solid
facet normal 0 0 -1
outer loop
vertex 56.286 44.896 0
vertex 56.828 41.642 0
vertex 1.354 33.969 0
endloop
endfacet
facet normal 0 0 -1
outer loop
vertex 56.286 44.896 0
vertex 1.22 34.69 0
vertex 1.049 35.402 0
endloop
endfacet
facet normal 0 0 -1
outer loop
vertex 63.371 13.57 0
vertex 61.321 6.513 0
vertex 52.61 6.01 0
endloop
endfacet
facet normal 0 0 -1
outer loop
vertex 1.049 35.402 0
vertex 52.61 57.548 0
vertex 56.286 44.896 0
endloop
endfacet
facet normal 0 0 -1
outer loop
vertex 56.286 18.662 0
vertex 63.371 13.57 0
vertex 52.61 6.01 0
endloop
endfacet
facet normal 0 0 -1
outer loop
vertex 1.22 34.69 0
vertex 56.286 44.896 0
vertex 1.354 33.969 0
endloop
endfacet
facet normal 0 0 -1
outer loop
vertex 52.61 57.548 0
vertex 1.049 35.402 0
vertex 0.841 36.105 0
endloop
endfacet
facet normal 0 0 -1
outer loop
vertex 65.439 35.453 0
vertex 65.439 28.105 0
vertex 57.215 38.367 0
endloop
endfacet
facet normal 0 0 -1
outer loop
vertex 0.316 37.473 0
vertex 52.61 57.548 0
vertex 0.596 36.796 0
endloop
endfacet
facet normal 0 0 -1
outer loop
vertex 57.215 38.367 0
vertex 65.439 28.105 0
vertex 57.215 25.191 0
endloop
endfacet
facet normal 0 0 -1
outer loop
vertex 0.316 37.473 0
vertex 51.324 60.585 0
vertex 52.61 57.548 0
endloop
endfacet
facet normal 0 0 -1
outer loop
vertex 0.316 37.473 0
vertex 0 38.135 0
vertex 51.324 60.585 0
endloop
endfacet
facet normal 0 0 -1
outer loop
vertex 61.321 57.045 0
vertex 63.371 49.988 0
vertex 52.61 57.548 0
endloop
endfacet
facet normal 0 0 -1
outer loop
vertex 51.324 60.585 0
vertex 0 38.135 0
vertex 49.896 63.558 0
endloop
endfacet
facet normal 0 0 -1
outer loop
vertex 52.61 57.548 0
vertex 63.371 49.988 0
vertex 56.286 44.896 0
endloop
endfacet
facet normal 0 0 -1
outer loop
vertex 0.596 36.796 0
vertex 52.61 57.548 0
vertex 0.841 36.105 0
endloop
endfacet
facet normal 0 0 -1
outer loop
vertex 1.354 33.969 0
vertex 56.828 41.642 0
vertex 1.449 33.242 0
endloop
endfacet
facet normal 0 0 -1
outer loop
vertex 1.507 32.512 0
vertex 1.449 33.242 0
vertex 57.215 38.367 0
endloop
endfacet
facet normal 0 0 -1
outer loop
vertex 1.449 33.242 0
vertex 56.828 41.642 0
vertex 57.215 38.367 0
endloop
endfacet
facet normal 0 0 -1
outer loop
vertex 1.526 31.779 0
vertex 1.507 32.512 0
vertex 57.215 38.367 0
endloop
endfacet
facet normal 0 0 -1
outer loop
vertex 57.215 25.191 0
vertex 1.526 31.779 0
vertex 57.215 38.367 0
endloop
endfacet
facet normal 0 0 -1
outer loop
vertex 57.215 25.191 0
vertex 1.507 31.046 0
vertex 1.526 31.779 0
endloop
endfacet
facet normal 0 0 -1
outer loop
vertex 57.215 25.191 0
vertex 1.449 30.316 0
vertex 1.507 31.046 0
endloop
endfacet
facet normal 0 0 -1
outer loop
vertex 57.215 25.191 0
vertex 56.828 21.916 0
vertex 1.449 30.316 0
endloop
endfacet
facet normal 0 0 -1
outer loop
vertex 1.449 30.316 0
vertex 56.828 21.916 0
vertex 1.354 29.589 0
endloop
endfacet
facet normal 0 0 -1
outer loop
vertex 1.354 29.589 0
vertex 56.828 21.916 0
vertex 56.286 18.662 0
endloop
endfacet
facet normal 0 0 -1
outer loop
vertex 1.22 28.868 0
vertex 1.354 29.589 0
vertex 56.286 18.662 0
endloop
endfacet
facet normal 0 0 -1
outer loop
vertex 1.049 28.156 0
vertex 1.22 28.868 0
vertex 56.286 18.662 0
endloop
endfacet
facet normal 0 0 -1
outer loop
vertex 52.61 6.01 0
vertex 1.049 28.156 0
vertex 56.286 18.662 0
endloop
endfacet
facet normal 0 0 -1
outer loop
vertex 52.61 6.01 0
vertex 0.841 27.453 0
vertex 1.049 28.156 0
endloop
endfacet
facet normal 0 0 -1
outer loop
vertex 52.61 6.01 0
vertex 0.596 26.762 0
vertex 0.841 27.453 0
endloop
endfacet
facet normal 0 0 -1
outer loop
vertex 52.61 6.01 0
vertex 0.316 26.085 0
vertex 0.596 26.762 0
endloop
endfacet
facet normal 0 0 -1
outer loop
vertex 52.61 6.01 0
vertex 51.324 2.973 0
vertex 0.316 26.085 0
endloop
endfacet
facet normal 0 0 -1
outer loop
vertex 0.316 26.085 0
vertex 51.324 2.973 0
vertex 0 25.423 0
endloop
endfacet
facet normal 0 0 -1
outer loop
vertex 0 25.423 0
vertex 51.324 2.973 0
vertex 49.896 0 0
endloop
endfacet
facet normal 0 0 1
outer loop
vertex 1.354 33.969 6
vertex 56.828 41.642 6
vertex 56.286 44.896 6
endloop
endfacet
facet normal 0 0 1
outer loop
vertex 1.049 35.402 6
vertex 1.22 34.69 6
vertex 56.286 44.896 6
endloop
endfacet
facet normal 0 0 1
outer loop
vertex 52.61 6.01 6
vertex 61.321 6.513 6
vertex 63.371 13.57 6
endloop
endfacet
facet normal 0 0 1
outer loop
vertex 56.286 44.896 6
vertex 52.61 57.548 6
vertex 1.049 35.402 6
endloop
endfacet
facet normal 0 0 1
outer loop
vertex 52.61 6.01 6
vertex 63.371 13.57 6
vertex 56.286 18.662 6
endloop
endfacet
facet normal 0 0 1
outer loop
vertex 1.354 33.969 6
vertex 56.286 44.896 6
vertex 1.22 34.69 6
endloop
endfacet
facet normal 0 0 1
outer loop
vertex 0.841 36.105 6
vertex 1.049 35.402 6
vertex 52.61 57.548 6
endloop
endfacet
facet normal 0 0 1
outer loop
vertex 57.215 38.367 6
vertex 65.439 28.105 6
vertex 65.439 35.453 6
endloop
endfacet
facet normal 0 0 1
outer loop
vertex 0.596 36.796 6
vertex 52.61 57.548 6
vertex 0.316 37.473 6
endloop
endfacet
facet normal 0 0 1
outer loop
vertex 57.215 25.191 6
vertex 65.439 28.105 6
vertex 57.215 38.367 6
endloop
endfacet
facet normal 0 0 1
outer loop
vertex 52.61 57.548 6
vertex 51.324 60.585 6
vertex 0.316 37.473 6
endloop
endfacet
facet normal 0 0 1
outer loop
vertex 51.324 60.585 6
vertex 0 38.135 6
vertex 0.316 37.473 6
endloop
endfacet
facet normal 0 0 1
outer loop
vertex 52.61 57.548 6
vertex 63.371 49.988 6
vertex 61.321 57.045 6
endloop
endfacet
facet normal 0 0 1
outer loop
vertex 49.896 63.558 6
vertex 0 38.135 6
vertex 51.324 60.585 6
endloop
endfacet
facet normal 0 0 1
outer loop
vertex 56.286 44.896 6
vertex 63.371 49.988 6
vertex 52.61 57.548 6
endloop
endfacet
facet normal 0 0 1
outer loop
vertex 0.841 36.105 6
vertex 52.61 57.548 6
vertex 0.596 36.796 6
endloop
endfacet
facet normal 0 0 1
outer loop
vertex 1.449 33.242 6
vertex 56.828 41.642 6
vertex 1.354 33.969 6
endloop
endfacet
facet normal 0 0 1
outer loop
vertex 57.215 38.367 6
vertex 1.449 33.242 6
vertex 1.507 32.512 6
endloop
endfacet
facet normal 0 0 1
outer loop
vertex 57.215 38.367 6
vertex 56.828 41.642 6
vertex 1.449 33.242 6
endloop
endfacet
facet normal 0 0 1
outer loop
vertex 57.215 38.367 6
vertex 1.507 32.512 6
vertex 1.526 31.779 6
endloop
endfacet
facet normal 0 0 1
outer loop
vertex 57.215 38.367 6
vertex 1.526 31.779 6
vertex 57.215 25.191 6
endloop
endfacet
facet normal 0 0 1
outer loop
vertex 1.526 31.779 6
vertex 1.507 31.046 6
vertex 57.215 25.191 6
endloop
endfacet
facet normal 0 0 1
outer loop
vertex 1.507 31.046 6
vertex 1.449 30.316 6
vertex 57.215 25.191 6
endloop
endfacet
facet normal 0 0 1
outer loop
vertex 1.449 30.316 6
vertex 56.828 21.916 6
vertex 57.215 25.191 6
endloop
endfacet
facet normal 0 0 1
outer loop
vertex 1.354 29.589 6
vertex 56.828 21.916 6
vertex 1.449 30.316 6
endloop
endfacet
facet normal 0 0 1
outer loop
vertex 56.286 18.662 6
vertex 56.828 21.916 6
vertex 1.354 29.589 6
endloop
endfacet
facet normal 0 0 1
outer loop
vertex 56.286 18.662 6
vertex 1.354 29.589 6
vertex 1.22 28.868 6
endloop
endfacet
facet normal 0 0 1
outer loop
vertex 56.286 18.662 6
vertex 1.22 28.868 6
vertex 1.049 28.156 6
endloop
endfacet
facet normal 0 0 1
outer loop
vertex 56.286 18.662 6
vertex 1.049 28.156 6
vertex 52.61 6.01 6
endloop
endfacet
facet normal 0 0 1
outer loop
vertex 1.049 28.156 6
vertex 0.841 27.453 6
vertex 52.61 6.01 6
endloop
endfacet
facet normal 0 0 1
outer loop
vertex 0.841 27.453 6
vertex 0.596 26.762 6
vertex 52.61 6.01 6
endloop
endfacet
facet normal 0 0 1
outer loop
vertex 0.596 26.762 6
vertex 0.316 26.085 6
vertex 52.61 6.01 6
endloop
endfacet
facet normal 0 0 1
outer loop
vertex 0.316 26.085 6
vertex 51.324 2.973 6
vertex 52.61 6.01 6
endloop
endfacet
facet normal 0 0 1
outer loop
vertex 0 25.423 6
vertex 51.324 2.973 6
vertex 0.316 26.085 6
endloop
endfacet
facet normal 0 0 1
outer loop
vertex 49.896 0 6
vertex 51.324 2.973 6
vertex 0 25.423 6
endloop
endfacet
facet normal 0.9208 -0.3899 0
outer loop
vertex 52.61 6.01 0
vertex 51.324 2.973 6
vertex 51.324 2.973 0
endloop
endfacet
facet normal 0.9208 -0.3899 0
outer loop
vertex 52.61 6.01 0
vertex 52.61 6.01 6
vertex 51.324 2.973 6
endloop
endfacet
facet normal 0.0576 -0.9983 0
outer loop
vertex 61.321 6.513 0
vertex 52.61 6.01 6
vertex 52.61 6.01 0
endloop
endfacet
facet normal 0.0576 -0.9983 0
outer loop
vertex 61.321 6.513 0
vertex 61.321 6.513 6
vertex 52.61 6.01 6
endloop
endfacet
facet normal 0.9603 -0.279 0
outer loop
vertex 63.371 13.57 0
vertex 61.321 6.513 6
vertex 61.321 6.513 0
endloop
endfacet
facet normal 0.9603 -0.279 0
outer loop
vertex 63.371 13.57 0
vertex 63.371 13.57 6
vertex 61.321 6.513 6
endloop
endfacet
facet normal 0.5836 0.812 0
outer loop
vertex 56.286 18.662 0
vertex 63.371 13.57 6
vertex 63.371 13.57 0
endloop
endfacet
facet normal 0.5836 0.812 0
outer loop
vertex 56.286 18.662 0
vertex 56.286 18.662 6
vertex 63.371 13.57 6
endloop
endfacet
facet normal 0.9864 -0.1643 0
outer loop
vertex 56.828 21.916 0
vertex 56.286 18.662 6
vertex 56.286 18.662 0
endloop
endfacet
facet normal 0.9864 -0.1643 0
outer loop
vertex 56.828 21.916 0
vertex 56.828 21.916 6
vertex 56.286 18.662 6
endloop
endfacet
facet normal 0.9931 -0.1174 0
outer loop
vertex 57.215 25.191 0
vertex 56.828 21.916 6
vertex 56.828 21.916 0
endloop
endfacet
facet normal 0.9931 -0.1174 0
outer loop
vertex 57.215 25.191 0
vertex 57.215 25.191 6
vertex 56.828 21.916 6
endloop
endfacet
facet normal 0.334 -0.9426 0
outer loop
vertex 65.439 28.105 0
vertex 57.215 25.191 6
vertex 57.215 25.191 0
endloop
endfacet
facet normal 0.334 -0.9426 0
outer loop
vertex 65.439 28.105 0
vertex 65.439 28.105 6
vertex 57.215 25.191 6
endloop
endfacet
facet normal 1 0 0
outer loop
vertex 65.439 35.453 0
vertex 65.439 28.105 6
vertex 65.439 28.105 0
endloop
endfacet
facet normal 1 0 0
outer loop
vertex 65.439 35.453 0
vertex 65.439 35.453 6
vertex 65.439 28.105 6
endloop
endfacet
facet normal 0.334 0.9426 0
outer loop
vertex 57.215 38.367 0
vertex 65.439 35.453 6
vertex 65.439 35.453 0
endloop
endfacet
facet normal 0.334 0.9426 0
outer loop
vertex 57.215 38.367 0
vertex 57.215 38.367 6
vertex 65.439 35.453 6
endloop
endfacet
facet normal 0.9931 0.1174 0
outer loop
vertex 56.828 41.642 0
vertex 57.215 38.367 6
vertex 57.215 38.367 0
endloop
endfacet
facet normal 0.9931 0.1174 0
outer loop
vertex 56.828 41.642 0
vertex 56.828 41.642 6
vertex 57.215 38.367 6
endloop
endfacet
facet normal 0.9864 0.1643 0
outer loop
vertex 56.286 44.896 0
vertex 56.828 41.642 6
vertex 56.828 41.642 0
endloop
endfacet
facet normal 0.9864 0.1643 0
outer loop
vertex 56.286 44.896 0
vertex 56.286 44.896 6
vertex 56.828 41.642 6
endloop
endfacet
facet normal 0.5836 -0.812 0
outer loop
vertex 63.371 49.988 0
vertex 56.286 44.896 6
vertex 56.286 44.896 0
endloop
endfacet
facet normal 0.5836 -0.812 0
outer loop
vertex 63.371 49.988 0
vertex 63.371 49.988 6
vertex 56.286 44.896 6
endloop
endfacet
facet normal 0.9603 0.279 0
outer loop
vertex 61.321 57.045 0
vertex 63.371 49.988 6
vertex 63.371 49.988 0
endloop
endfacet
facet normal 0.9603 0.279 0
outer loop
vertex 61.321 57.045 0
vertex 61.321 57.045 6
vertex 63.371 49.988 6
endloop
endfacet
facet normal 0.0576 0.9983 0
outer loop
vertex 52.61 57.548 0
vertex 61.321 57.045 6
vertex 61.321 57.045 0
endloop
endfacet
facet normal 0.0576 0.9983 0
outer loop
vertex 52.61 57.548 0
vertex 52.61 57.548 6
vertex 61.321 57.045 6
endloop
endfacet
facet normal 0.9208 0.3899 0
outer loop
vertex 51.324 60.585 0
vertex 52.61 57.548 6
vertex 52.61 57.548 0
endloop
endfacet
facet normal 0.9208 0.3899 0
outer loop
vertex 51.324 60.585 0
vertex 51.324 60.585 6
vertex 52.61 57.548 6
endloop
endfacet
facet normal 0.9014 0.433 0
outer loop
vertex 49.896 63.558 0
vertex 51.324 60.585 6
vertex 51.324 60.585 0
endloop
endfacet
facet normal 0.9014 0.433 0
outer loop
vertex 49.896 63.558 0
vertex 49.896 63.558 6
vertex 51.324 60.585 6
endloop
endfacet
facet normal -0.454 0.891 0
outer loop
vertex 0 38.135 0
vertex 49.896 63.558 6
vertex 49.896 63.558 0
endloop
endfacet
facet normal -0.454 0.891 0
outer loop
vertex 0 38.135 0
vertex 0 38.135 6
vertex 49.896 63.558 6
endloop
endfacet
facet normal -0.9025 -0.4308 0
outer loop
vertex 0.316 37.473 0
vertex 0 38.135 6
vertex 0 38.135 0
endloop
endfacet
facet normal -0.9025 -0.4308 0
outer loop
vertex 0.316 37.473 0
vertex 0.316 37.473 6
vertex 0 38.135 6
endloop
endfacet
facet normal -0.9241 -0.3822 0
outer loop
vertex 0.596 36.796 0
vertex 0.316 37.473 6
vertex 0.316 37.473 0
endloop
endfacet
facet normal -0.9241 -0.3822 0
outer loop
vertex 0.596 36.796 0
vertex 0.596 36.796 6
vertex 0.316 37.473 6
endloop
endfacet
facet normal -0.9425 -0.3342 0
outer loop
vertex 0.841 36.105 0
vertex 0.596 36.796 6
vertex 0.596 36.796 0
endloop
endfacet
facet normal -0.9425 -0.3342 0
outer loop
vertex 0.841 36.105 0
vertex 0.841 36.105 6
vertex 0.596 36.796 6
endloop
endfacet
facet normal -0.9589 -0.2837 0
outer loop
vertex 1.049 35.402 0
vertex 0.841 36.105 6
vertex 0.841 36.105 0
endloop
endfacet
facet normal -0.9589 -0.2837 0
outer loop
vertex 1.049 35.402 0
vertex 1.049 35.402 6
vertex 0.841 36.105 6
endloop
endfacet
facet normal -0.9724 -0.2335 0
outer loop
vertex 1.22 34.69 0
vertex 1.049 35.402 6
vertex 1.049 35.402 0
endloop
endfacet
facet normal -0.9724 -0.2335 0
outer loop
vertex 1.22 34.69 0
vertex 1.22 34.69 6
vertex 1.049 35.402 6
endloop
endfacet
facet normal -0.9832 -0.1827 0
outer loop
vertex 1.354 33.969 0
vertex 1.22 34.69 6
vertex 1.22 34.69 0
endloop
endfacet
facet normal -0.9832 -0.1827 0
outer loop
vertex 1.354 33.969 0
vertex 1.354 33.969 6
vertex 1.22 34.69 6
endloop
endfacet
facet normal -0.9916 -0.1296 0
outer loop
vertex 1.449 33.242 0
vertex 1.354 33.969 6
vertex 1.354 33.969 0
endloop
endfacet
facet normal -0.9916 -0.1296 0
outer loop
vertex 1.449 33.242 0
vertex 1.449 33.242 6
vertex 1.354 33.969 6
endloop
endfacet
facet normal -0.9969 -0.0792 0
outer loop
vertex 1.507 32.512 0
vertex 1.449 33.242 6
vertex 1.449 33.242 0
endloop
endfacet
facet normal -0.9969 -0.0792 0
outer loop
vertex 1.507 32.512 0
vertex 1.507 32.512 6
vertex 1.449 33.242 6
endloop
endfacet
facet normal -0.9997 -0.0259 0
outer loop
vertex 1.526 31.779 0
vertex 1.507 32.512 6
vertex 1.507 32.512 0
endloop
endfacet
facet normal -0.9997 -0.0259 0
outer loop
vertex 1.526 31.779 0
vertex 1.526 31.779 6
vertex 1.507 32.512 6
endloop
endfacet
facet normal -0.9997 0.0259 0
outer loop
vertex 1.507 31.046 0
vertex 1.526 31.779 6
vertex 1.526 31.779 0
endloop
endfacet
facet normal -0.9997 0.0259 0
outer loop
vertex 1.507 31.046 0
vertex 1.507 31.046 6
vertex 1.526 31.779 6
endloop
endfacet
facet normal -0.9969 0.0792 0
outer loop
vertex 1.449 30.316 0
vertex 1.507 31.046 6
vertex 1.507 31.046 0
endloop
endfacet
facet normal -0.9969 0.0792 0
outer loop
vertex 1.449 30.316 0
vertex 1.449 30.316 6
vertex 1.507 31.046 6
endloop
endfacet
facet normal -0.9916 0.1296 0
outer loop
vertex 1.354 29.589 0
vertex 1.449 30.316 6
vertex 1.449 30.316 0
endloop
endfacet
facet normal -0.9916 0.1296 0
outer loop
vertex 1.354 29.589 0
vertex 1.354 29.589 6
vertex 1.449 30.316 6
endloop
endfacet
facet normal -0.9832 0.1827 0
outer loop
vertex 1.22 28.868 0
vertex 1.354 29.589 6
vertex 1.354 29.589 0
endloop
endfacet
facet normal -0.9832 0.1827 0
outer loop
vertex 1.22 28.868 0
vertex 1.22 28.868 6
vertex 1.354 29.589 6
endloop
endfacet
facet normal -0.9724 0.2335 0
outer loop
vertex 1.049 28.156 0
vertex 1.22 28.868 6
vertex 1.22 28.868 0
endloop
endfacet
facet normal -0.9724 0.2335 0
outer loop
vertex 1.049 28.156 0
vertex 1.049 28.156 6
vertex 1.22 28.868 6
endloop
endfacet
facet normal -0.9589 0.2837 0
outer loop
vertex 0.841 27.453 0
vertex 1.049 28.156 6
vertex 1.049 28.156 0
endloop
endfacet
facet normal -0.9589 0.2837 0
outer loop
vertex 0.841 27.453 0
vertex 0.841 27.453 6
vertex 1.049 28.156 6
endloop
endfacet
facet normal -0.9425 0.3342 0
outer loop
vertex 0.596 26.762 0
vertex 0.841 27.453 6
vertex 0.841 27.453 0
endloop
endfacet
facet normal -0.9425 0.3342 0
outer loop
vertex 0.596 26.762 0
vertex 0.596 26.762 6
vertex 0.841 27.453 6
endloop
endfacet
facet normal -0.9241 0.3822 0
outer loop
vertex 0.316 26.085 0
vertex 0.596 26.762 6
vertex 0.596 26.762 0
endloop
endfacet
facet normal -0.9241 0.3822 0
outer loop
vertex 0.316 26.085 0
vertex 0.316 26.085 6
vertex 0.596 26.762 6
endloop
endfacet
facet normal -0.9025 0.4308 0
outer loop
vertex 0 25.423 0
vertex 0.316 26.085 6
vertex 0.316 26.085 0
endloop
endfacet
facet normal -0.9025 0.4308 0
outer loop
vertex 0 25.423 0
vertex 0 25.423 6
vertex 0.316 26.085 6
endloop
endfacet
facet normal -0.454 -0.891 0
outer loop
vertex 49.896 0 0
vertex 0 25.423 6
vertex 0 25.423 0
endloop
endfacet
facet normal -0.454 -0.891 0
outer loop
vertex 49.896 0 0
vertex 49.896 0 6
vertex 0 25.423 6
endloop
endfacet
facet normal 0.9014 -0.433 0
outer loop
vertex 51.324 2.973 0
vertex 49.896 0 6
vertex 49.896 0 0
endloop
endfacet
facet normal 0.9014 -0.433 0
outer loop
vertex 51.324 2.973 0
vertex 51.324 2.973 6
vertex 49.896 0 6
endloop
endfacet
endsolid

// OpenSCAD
$fn = 32;

// ----------------------------------------------------------------------
// Gear sector: 3 teeth on 54 degrees
// ----------------------------------------------------------------------

// --- parameters (mm) ---
sector_angle = 54;        // sector angle, degrees
root_r = 70;              // root circle radius
tooth_h = 8;              // tooth height over the root circle
teeth = 3;                // number of teeth on the sector
hub_r = 14;               // hub bore radius
plate_t = 6;              // sector thickness, Z
arc_step = 3;             // sampling step of the root/hub arcs, degrees
fit_tol = 0.02;           // declared fit tolerance (prompt contract)
free_tol = 0.2;           // declared free tolerance (prompt contract)

tip_r = root_r + tooth_h;  // tip circle radius

profile = [[49.896, 0], [51.324, 2.973], [52.61, 6.01], [61.321, 6.513], [63.371, 13.57], [56.286, 18.662], [56.828, 21.916], [57.215, 25.191], [65.439, 28.105], [65.439, 35.453], [57.215, 38.367], [56.828, 41.642], [56.286, 44.896], [63.371, 49.988], [61.321, 57.045], [52.61, 57.548], [51.324, 60.585], [49.896, 63.558], [0, 38.135], [0.316, 37.473], [0.596, 36.796], [0.841, 36.105], [1.049, 35.402], [1.22, 34.69], [1.354, 33.969], [1.449, 33.242], [1.507, 32.512], [1.526, 31.779], [1.507, 31.046], [1.449, 30.316], [1.354, 29.589], [1.22, 28.868], [1.049, 28.156], [0.841, 27.453], [0.596, 26.762], [0.316, 26.085], [0, 25.423]];  // primary outline, 37 points, counter clockwise

// --- the one profile operation ---
linear_extrude(height = plate_t) polygon(points = profile);
